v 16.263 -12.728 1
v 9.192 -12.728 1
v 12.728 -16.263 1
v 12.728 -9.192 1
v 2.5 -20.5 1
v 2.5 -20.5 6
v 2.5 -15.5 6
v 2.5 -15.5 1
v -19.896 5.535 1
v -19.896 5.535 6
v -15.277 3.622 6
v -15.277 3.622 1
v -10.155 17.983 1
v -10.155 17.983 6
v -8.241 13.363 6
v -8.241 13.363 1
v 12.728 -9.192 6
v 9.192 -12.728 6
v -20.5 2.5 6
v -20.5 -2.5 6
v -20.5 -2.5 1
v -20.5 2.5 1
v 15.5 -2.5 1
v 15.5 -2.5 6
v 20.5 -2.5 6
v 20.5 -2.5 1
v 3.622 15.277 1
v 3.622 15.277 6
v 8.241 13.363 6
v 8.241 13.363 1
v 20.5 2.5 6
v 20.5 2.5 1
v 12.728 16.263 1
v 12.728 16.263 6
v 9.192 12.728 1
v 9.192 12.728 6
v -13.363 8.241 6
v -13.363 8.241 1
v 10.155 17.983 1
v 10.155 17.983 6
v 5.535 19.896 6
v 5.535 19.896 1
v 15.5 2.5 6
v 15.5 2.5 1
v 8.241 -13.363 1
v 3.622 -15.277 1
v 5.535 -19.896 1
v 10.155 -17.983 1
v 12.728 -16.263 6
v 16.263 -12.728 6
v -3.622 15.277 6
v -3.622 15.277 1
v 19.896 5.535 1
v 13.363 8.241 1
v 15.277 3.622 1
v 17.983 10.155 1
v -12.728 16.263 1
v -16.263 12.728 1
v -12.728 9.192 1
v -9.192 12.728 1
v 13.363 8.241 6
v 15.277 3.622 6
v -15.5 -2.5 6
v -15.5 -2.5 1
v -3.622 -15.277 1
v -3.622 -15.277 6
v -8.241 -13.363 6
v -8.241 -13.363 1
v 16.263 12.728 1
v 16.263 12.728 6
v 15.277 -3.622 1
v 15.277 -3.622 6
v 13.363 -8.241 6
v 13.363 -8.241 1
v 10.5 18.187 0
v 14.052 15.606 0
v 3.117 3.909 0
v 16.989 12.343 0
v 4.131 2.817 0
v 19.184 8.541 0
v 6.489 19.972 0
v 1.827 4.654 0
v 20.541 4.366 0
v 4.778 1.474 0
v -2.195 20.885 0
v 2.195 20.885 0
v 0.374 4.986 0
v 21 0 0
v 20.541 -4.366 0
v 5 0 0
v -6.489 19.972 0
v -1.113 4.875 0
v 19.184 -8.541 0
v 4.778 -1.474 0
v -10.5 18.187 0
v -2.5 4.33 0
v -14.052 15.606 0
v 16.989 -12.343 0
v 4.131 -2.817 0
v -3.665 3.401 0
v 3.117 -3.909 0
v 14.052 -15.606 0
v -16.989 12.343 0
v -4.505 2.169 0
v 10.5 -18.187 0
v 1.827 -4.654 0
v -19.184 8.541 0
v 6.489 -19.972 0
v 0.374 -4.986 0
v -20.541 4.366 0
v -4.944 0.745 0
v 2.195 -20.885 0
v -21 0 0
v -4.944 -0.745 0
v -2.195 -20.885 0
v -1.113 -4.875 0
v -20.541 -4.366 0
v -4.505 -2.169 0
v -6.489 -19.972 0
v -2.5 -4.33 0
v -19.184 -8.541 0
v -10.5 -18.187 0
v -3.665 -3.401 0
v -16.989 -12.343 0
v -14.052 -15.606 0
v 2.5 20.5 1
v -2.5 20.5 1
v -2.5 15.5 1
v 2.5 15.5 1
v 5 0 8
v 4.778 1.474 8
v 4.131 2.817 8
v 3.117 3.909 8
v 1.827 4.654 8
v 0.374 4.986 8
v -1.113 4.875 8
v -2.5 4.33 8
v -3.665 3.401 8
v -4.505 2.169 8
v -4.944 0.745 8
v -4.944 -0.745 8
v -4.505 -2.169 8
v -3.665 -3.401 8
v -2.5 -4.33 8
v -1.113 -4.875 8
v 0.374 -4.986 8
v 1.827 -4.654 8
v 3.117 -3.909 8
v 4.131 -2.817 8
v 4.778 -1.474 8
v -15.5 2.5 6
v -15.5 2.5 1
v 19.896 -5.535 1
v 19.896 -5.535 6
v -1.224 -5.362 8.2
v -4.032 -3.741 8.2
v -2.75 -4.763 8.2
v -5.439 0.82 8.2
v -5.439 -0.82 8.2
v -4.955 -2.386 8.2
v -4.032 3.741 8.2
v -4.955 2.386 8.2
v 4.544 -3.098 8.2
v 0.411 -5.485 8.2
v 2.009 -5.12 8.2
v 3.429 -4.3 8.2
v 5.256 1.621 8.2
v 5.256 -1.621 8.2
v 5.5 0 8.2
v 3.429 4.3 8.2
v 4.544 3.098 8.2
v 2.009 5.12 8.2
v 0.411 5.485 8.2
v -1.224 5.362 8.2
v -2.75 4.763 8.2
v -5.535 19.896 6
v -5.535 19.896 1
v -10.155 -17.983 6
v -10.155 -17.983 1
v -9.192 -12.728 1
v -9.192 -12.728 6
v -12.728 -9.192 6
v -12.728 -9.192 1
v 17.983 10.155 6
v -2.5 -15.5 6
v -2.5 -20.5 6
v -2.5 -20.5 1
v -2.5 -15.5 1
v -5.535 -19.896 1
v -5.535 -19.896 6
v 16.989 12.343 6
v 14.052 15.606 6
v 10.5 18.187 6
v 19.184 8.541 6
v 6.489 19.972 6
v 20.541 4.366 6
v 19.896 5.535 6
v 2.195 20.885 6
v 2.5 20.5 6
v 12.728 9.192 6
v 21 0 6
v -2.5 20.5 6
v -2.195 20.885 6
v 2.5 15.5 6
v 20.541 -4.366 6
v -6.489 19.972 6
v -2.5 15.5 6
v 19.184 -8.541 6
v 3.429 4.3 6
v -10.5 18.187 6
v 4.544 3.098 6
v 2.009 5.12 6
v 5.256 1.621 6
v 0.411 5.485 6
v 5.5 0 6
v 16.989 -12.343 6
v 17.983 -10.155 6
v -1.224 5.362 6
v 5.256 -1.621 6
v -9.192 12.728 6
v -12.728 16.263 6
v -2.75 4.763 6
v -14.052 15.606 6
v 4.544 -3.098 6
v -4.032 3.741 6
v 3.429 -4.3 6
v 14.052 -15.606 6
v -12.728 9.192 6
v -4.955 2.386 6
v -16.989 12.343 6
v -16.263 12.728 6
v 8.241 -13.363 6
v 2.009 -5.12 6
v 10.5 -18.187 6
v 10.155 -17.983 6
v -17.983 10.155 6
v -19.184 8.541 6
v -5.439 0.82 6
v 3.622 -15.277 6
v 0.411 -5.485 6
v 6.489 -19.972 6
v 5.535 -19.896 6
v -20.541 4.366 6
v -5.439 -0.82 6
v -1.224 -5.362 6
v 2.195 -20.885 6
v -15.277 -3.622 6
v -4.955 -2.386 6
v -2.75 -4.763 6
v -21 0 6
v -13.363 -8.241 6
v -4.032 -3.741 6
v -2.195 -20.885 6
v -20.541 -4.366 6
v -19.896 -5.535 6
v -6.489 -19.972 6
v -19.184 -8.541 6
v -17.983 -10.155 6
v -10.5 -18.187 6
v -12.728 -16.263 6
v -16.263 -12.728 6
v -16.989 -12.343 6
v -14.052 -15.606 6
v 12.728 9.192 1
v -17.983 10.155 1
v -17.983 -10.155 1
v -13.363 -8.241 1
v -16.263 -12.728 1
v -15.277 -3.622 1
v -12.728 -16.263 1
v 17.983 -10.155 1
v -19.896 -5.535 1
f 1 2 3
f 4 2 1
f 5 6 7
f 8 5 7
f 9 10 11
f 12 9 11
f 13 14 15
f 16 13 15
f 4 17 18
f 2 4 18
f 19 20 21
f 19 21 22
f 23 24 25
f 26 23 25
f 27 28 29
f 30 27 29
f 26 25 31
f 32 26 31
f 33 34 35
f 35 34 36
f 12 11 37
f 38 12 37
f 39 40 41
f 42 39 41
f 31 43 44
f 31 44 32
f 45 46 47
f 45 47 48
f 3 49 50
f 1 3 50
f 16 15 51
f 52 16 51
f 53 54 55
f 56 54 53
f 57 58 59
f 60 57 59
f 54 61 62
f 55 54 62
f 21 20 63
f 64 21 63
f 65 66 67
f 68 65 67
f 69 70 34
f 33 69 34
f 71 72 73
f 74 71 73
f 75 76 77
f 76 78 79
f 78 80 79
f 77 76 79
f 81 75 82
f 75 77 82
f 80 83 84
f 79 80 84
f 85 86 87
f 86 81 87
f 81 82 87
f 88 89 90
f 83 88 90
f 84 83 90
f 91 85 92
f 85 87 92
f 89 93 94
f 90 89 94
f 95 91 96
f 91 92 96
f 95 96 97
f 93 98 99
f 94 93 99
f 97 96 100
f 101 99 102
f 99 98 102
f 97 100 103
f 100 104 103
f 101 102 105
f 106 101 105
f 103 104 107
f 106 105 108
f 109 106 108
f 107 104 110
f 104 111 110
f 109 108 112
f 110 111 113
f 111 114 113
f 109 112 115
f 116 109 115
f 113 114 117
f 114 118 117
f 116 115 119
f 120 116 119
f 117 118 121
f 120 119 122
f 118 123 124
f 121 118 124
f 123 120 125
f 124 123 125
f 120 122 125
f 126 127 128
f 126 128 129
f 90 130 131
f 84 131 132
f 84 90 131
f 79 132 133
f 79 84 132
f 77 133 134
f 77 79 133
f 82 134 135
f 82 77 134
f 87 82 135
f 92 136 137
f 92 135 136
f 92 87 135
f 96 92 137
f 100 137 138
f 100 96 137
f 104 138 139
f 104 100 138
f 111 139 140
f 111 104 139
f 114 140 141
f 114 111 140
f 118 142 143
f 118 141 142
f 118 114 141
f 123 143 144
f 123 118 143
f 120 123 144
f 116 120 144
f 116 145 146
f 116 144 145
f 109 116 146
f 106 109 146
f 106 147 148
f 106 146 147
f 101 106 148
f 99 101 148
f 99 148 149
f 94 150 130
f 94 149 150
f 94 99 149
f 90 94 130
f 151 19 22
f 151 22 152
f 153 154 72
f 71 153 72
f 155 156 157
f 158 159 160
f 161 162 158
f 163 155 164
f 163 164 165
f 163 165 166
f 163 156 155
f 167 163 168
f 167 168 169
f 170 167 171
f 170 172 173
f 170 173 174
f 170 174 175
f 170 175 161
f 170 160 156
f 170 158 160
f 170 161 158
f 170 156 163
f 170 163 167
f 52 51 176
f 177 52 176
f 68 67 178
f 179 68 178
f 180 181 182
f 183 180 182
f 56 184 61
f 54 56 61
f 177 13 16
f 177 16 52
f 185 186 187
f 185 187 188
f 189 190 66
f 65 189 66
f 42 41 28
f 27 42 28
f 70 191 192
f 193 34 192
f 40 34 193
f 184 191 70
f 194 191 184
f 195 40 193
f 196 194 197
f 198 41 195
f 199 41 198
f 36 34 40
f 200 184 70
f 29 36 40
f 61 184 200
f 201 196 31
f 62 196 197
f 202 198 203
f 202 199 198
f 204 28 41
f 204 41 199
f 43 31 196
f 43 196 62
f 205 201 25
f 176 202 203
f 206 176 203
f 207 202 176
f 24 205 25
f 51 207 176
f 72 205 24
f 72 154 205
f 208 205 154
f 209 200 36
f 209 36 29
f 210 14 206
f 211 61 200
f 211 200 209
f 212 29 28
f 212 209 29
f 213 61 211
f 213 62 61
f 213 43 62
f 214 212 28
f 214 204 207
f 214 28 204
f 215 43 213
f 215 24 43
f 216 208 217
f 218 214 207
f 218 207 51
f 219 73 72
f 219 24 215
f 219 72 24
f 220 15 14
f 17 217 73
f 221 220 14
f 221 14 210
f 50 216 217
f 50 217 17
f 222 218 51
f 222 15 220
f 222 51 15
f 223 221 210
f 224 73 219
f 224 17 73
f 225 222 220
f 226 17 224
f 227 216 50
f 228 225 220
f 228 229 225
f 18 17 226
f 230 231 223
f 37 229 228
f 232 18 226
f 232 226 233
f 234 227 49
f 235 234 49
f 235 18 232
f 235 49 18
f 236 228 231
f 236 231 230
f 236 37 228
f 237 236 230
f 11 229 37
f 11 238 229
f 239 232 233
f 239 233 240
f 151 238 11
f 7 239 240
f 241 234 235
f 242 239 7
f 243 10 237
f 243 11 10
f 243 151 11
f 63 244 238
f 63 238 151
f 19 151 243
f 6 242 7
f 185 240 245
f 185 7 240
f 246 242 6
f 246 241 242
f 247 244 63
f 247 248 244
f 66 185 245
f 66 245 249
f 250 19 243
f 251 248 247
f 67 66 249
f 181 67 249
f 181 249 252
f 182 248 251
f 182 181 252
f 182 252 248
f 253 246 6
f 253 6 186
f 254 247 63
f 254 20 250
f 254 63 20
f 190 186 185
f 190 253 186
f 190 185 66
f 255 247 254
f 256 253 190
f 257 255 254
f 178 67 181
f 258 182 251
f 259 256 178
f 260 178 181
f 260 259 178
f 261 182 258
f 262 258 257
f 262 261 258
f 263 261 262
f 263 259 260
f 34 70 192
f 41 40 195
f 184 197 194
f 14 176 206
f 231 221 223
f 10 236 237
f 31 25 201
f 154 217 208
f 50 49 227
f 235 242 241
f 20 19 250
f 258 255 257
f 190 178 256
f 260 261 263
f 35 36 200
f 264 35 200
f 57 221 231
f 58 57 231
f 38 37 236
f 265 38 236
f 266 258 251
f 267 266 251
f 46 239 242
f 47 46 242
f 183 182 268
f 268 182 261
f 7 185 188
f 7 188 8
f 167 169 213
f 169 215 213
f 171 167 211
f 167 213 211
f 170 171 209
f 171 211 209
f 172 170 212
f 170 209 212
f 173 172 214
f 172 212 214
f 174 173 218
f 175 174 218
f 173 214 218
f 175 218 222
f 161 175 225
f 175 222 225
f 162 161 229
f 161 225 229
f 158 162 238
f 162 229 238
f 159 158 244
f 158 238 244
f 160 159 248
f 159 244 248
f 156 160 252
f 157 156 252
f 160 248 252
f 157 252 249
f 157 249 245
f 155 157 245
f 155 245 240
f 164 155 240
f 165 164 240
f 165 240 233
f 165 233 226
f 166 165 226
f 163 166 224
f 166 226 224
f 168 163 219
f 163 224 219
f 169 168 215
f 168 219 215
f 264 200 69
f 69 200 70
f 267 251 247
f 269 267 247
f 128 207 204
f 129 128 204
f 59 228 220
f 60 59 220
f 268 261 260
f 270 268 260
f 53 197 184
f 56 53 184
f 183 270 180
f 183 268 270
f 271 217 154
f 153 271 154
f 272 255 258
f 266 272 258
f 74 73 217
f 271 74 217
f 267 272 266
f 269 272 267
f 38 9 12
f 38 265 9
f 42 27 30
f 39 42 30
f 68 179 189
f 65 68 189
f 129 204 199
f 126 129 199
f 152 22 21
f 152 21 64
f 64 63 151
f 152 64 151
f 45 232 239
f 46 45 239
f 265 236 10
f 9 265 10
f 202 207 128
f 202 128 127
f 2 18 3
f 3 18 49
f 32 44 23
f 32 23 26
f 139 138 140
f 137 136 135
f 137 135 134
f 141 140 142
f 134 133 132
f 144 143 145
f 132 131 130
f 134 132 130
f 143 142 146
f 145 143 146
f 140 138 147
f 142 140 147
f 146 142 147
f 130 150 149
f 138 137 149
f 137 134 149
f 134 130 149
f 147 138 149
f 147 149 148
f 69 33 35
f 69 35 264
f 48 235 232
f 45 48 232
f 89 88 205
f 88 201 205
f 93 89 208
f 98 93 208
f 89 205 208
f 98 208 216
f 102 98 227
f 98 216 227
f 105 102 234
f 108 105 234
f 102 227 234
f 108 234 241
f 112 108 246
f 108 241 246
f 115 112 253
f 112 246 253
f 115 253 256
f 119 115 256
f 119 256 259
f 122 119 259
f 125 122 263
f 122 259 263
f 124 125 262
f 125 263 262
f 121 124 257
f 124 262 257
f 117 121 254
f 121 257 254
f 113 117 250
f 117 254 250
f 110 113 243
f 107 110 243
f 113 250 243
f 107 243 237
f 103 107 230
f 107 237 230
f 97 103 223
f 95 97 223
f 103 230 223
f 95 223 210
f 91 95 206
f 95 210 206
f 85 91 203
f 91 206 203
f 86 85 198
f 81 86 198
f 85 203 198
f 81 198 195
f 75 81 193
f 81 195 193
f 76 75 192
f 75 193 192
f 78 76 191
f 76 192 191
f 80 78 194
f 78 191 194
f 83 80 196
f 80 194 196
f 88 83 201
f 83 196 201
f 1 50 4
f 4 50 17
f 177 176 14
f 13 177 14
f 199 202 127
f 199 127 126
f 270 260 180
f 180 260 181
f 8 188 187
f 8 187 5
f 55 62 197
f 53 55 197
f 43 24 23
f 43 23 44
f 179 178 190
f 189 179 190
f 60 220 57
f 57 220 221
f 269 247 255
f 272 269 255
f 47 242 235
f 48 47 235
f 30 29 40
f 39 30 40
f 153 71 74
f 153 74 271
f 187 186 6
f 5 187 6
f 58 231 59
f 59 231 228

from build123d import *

# Parameters (mm, degrees)
F0_W     = 21
F0_H     = 6
F2_R     = 5
F3_DEPTH = 25
F4_W     = 5
F4_H     = 5
F5_DEPTH = 5
F2_R_2   = 5.5
F6_DEPTH = 8.2


# Not quite as in the source:
# - a feature names something its author has since deleted; it is built from what else it names


with BuildPart() as f1:
    # F0 (on Front) → F1 (revolve)
    with BuildSketch(Plane.XZ):
        with Locations((10.5, 3)):
            Rectangle(F0_W, F0_H)
    revolve(axis=Axis((0, 0, 3), (0, 0, -1)))

    # F2 (on Top) → F3 (cut)
    with BuildSketch(Plane.XY):
        Circle(F2_R)
    extrude(amount=F3_DEPTH, mode=Mode.SUBTRACT)

    # F4 (on face) → F5 (cut)
    with BuildSketch(Plane.XY.offset(6)):
        with Locations((0, 18)):
            Rectangle(F4_W, F4_H)
        Polygon((5.5353115322, 19.8962389974), (3.6218943704, 15.2768413348), (8.2412920329, 13.363424173), (10.1547091948, 17.9828218356), align=None)
        Polygon((12.7279220614, 16.2634559673), (9.1923881554, 12.7279220614), (12.7279220614, 9.1923881554), (16.2634559673, 12.7279220614), align=None)
        Polygon((17.9828218356, 10.1547091948), (13.363424173, 8.2412920329), (15.2768413348, 3.6218943704), (19.8962389974, 5.5353115322), align=None)
        with Locations((18, 0)):
            Rectangle(F4_W, F4_H)
        Polygon((19.8962389974, -5.5353115322), (15.2768413348, -3.6218943704), (13.363424173, -8.2412920329), (17.9828218356, -10.1547091948), align=None)
        Polygon((16.2634559673, -12.7279220614), (12.7279220614, -9.1923881554), (9.1923881554, -12.7279220614), (12.7279220614, -16.2634559673), align=None)
        Polygon((10.1547091948, -17.9828218356), (8.2412920329, -13.363424173), (3.6218943704, -15.2768413348), (5.5353115322, -19.8962389974), align=None)
        with Locations((0, -18)):
            Rectangle(F4_W, F4_H)
        Polygon((-5.5353115322, -19.8962389974), (-3.6218943704, -15.2768413348), (-8.2412920329, -13.363424173), (-10.1547091948, -17.9828218356), align=None)
        Polygon((-12.7279220614, -16.2634559673), (-9.1923881554, -12.7279220614), (-12.7279220614, -9.1923881554), (-16.2634559673, -12.7279220614), align=None)
        Polygon((-17.9828218356, -10.1547091948), (-13.363424173, -8.2412920329), (-15.2768413348, -3.6218943704), (-19.8962389974, -5.5353115322), align=None)
        with Locations((-18, 0)):
            Rectangle(F4_W, F4_H)
        Polygon((-19.8962389974, 5.5353115322), (-15.2768413348, 3.6218943704), (-13.363424173, 8.2412920329), (-17.9828218356, 10.1547091948), align=None)
        Polygon((-16.2634559673, 12.7279220614), (-12.7279220614, 9.1923881554), (-9.1923881554, 12.7279220614), (-12.7279220614, 16.2634559673), align=None)
        Polygon((-10.1547091948, 17.9828218356), (-8.2412920329, 13.363424173), (-3.6218943704, 15.2768413348), (-5.5353115322, 19.8962389974), align=None)
    extrude(amount=-F5_DEPTH, mode=Mode.SUBTRACT)

    # F2 (on Top) → F6 (join)
    with BuildSketch(Plane.XY):
        Circle(F2_R_2)
        Circle(F2_R, mode=Mode.SUBTRACT)
    extrude(amount=F6_DEPTH)

    # F7 (on Right) → F8 (revolve)
    with BuildSketch(Plane.YZ):
        Polygon((0, 8.2), (0, 8), (5.5, 8), (5.5, 8.2), (5.4786731489, 8.2), align=None)
    revolve(axis=Axis((0, 0, 8.1), (0, 0, -1)))


solid = f1.part
